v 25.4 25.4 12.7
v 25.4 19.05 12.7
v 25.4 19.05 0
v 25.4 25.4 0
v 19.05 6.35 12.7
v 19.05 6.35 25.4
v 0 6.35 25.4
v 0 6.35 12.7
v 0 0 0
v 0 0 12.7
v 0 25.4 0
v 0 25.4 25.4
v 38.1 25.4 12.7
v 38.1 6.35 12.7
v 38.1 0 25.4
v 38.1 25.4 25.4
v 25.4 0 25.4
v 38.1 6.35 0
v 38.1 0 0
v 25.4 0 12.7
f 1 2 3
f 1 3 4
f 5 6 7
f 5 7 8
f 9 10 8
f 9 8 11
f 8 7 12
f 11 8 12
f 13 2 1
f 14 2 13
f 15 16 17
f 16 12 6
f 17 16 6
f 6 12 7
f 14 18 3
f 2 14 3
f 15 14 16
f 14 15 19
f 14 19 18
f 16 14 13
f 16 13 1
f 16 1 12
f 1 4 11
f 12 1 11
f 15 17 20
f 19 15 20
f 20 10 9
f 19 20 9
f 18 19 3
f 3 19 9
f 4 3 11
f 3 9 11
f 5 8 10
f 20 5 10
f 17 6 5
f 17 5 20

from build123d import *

# Parameters (mm, degrees)
F3_DEPTH = 25.4
F0_W     = 12.7
F0_H     = 12.7
F4_DEPTH = 25.4
F5_DEPTH = 25.4


with BuildPart() as f3:
    # F1 (on Top) → F3 (new body)
    with BuildSketch(Plane.XY):
        Polygon((19.05, 25.4), (0, 25.4), (25.4, 0), (38.1, 0), (38.1, 6.35), align=None)
    extrude(amount=F3_DEPTH)

    # F0 (on Front) → F4 (join)
    with BuildSketch(Plane.XZ):
        with Locations((31.75, 19.05)):
            Rectangle(F0_W, F0_H)
    extrude(amount=-F4_DEPTH)

    # F2 (on Right) → F5 (join)
    with BuildSketch(Plane.YZ):
        Polygon((0, 12.7), (0, 0), (25.4, 0), (25.4, 25.4), (6.35, 25.4), (6.35, 12.7), align=None)
    extrude(amount=F5_DEPTH)


solid = f3.part
